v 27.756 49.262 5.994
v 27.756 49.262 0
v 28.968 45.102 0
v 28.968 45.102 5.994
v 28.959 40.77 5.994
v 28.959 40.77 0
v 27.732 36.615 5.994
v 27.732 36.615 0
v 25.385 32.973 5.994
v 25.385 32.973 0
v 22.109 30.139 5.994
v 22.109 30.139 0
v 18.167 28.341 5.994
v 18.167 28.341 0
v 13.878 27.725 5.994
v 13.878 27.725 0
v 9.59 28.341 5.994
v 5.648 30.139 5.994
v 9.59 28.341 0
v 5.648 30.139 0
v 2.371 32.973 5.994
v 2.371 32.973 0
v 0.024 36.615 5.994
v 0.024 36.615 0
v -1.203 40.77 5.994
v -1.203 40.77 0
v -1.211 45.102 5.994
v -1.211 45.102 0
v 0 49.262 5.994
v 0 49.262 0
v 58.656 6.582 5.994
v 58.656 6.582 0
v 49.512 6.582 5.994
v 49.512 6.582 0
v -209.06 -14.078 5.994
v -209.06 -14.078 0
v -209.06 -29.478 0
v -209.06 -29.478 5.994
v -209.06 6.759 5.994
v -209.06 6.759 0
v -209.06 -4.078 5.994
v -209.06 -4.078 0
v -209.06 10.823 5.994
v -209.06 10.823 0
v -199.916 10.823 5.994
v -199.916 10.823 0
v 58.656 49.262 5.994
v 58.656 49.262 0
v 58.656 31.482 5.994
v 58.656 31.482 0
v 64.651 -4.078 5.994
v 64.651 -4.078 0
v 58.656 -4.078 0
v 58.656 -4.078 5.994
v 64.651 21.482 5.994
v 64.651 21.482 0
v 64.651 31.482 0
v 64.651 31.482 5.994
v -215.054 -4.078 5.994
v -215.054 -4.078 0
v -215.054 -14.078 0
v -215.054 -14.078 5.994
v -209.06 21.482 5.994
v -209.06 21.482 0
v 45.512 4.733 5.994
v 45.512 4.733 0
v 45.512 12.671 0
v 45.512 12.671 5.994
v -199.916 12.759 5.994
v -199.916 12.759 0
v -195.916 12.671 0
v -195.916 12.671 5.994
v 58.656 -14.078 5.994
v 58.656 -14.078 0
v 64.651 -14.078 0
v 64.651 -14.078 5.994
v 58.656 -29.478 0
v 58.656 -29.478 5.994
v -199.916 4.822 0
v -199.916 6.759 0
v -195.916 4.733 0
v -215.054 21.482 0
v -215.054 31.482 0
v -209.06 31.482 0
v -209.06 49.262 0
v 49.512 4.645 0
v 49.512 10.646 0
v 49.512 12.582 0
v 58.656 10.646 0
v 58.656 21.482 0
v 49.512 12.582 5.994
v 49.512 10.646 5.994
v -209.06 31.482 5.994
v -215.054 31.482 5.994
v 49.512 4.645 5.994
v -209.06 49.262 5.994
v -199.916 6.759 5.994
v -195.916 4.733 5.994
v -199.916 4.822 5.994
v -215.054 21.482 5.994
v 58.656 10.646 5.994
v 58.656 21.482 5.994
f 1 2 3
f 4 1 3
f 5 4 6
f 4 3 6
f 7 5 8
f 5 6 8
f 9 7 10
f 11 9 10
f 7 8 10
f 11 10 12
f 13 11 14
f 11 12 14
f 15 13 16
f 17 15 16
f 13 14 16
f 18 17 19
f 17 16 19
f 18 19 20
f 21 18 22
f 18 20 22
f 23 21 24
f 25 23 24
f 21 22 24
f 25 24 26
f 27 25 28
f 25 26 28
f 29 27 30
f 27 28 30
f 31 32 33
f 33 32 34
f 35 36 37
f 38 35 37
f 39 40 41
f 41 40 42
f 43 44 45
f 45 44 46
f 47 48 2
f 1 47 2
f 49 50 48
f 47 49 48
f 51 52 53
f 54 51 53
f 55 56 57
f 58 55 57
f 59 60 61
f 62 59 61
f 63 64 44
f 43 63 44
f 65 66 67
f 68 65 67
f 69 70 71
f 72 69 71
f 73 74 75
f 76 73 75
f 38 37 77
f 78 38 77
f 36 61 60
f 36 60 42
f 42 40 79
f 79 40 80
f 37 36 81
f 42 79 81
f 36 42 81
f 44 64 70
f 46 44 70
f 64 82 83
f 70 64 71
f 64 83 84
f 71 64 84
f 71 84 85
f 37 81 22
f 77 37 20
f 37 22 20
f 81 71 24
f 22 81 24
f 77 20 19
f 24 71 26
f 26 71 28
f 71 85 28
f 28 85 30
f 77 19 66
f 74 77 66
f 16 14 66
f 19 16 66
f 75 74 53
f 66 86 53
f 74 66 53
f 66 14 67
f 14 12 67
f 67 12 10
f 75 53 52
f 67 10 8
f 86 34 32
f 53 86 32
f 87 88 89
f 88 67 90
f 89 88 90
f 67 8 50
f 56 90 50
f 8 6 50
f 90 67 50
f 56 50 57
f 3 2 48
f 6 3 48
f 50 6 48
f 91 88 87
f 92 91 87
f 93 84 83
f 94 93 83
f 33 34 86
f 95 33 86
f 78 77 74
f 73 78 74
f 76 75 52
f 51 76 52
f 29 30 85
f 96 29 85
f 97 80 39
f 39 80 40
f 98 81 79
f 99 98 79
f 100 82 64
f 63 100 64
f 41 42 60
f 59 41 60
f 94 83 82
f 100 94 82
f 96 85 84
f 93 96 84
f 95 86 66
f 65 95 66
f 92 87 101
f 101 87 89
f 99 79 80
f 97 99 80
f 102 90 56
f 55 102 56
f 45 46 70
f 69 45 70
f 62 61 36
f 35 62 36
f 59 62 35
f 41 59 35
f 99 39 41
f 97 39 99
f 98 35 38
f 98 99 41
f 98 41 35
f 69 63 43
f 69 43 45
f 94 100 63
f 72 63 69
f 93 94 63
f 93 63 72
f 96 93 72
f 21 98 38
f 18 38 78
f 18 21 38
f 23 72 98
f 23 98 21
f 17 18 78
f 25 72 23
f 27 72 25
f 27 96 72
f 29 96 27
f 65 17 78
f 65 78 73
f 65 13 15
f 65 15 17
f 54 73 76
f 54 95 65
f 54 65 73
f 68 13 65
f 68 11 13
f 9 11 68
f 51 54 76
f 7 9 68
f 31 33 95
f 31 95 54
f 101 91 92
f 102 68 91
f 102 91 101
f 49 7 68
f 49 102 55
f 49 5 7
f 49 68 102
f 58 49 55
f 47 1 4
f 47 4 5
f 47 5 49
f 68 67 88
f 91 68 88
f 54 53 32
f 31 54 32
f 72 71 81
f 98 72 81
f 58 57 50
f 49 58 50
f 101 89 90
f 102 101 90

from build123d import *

# Parameters (mm, degrees)
EXTRUDE1_DEPTH = 5.9944


with BuildPart() as part:
    # Sketch1 → Extrude1 (new body)
    with BuildSketch(Plane.XY):
        with BuildLine():
            Line((-209.059629258, -14.077865934), (-209.059629258, -29.477865934))
            Line((-209.059629258, -29.477865934), (58.656370742, -29.477865934))
            Line((58.656370742, -29.477865934), (58.656370742, -14.077865934))
            Line((58.656370742, -14.077865934), (64.650770742, -14.077865934))
            Line((64.650770742, -14.077865934), (64.650770742, -4.077865934))
            Line((64.650770742, -4.077865934), (58.656370742, -4.077865934))
            Line((58.656370742, -4.077865934), (58.656370742, 6.581535434))
            Line((58.656370742, 6.581535434), (49.512370742, 6.581535434))
            Line((49.512370742, 6.581535434), (49.512370742, 4.644785434))
            Line((49.512370742, 4.644785434), (45.512370742, 4.733384066))
            Line((45.512370742, 4.733384066), (45.512370742, 12.670884066))
            Line((45.512370742, 12.670884066), (49.512370742, 12.582285434))
            Line((49.512370742, 12.582285434), (49.512370742, 10.645535434))
            Line((49.512370742, 10.645535434), (58.656370742, 10.645535434))
            Line((58.656370742, 10.645535434), (58.656370742, 21.482134066))
            Line((58.656370742, 21.482134066), (64.650770742, 21.482134066))
            Line((64.650770742, 21.482134066), (64.650770742, 31.482134066))
            Line((64.650770742, 31.482134066), (58.656370742, 31.482134066))
            Line((58.656370742, 31.482134066), (58.656370742, 49.262134066))
            Line((58.656370742, 49.262134066), (27.756302278, 49.262134066))
            ThreePointArc((27.756302278, 49.262134066), (13.878151139, 27.724950493), (0, 49.262134066))
            Line((0, 49.262134066), (-209.059629258, 49.262134066))
            Line((-209.059629258, 49.262134066), (-209.059629258, 31.482134066))
            Line((-209.059629258, 31.482134066), (-215.054029258, 31.482134066))
            Line((-215.054029258, 31.482134066), (-215.054029258, 21.482134066))
            Line((-215.054029258, 21.482134066), (-209.059629258, 21.482134066))
            Line((-209.059629258, 21.482134066), (-209.059629258, 10.822732699))
            Line((-209.059629258, 10.822732699), (-199.915629258, 10.822732699))
            Line((-199.915629258, 10.822732699), (-199.915629258, 12.759482699))
            Line((-199.915629258, 12.759482699), (-195.915629258, 12.670884066))
            Line((-195.915629258, 12.670884066), (-195.915629258, 4.733384066))
            Line((-195.915629258, 4.733384066), (-199.915629258, 4.821982699))
            Line((-199.915629258, 4.821982699), (-199.915629258, 6.758732699))
            Line((-199.915629258, 6.758732699), (-209.059629258, 6.758732699))
            Line((-209.059629258, 6.758732699), (-209.059629258, -4.077865934))
            Line((-209.059629258, -4.077865934), (-215.054029258, -4.077865934))
            Line((-215.054029258, -4.077865934), (-215.054029258, -14.077865934))
            Line((-215.054029258, -14.077865934), (-209.059629258, -14.077865934))
        make_face()
    extrude(amount=EXTRUDE1_DEPTH)


solid = part.part
